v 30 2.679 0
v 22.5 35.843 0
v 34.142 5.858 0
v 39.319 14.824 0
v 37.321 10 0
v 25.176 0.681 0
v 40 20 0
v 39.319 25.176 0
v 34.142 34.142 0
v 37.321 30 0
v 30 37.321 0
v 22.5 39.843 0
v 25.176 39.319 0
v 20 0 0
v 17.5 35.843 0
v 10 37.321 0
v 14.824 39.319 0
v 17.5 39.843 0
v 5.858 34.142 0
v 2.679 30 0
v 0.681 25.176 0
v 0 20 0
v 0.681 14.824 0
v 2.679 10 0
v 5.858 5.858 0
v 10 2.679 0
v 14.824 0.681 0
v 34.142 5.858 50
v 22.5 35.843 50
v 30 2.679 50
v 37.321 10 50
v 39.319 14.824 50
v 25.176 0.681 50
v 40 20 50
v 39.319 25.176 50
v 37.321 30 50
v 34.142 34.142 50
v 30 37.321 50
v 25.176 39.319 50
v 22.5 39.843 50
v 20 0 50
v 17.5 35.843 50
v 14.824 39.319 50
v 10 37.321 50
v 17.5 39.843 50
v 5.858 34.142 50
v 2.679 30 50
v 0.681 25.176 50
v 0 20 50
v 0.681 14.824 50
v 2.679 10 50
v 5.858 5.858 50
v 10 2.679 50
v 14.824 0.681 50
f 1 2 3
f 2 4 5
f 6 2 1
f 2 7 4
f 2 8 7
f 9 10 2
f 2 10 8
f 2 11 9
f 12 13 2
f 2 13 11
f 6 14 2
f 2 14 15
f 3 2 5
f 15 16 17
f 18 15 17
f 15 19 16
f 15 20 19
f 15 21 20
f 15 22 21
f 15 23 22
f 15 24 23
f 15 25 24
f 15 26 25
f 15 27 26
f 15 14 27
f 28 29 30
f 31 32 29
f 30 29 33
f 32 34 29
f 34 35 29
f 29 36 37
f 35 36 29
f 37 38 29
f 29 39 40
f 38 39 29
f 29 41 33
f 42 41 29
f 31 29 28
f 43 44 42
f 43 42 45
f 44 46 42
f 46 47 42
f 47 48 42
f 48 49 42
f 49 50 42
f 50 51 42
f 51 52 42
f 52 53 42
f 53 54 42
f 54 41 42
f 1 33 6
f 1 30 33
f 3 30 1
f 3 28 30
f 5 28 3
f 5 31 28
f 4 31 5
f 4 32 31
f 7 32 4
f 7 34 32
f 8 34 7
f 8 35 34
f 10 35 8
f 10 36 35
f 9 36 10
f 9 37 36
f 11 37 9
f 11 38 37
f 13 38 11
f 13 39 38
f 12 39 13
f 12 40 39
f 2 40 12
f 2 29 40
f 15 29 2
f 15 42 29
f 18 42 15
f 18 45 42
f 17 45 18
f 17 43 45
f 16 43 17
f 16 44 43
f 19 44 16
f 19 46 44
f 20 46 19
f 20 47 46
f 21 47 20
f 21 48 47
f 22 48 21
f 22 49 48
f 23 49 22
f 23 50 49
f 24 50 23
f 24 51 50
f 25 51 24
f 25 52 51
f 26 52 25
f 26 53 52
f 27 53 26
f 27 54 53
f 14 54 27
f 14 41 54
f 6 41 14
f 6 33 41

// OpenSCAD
$fn = 32;

// ----------------------------------------------------------------------
// Keyway shaft: d40 shaft, key 5 x 4 mm
// ----------------------------------------------------------------------

// --- parameters (mm) ---
shaft_r = 20;             // shaft radius
key_w = 5;                // keyway width
key_d = 4;                // keyway depth below the surface line
plate_t = 50;             // shaft length, Z (extrusion height)

shaft_d = 2 * shaft_r;  // shaft diameter
circle_step = 15;  // polygon sampling step, degrees

profile = [[14.824, 39.319], [10, 37.321], [5.858, 34.142], [2.679, 30], [0.681, 25.176], [0, 20], [0.681, 14.824], [2.679, 10], [5.858, 5.858], [10, 2.679], [14.824, 0.681], [20, 0], [25.176, 0.681], [30, 2.679], [34.142, 5.858], [37.321, 10], [39.319, 14.824], [40, 20], [39.319, 25.176], [37.321, 30], [34.142, 34.142], [30, 37.321], [25.176, 39.319], [22.5, 39.843], [22.5, 35.843], [17.5, 35.843], [17.5, 39.843]];  // primary outline, 27 points, counter clockwise

// --- the one profile operation ---
linear_extrude(height = plate_t) polygon(points = profile);
